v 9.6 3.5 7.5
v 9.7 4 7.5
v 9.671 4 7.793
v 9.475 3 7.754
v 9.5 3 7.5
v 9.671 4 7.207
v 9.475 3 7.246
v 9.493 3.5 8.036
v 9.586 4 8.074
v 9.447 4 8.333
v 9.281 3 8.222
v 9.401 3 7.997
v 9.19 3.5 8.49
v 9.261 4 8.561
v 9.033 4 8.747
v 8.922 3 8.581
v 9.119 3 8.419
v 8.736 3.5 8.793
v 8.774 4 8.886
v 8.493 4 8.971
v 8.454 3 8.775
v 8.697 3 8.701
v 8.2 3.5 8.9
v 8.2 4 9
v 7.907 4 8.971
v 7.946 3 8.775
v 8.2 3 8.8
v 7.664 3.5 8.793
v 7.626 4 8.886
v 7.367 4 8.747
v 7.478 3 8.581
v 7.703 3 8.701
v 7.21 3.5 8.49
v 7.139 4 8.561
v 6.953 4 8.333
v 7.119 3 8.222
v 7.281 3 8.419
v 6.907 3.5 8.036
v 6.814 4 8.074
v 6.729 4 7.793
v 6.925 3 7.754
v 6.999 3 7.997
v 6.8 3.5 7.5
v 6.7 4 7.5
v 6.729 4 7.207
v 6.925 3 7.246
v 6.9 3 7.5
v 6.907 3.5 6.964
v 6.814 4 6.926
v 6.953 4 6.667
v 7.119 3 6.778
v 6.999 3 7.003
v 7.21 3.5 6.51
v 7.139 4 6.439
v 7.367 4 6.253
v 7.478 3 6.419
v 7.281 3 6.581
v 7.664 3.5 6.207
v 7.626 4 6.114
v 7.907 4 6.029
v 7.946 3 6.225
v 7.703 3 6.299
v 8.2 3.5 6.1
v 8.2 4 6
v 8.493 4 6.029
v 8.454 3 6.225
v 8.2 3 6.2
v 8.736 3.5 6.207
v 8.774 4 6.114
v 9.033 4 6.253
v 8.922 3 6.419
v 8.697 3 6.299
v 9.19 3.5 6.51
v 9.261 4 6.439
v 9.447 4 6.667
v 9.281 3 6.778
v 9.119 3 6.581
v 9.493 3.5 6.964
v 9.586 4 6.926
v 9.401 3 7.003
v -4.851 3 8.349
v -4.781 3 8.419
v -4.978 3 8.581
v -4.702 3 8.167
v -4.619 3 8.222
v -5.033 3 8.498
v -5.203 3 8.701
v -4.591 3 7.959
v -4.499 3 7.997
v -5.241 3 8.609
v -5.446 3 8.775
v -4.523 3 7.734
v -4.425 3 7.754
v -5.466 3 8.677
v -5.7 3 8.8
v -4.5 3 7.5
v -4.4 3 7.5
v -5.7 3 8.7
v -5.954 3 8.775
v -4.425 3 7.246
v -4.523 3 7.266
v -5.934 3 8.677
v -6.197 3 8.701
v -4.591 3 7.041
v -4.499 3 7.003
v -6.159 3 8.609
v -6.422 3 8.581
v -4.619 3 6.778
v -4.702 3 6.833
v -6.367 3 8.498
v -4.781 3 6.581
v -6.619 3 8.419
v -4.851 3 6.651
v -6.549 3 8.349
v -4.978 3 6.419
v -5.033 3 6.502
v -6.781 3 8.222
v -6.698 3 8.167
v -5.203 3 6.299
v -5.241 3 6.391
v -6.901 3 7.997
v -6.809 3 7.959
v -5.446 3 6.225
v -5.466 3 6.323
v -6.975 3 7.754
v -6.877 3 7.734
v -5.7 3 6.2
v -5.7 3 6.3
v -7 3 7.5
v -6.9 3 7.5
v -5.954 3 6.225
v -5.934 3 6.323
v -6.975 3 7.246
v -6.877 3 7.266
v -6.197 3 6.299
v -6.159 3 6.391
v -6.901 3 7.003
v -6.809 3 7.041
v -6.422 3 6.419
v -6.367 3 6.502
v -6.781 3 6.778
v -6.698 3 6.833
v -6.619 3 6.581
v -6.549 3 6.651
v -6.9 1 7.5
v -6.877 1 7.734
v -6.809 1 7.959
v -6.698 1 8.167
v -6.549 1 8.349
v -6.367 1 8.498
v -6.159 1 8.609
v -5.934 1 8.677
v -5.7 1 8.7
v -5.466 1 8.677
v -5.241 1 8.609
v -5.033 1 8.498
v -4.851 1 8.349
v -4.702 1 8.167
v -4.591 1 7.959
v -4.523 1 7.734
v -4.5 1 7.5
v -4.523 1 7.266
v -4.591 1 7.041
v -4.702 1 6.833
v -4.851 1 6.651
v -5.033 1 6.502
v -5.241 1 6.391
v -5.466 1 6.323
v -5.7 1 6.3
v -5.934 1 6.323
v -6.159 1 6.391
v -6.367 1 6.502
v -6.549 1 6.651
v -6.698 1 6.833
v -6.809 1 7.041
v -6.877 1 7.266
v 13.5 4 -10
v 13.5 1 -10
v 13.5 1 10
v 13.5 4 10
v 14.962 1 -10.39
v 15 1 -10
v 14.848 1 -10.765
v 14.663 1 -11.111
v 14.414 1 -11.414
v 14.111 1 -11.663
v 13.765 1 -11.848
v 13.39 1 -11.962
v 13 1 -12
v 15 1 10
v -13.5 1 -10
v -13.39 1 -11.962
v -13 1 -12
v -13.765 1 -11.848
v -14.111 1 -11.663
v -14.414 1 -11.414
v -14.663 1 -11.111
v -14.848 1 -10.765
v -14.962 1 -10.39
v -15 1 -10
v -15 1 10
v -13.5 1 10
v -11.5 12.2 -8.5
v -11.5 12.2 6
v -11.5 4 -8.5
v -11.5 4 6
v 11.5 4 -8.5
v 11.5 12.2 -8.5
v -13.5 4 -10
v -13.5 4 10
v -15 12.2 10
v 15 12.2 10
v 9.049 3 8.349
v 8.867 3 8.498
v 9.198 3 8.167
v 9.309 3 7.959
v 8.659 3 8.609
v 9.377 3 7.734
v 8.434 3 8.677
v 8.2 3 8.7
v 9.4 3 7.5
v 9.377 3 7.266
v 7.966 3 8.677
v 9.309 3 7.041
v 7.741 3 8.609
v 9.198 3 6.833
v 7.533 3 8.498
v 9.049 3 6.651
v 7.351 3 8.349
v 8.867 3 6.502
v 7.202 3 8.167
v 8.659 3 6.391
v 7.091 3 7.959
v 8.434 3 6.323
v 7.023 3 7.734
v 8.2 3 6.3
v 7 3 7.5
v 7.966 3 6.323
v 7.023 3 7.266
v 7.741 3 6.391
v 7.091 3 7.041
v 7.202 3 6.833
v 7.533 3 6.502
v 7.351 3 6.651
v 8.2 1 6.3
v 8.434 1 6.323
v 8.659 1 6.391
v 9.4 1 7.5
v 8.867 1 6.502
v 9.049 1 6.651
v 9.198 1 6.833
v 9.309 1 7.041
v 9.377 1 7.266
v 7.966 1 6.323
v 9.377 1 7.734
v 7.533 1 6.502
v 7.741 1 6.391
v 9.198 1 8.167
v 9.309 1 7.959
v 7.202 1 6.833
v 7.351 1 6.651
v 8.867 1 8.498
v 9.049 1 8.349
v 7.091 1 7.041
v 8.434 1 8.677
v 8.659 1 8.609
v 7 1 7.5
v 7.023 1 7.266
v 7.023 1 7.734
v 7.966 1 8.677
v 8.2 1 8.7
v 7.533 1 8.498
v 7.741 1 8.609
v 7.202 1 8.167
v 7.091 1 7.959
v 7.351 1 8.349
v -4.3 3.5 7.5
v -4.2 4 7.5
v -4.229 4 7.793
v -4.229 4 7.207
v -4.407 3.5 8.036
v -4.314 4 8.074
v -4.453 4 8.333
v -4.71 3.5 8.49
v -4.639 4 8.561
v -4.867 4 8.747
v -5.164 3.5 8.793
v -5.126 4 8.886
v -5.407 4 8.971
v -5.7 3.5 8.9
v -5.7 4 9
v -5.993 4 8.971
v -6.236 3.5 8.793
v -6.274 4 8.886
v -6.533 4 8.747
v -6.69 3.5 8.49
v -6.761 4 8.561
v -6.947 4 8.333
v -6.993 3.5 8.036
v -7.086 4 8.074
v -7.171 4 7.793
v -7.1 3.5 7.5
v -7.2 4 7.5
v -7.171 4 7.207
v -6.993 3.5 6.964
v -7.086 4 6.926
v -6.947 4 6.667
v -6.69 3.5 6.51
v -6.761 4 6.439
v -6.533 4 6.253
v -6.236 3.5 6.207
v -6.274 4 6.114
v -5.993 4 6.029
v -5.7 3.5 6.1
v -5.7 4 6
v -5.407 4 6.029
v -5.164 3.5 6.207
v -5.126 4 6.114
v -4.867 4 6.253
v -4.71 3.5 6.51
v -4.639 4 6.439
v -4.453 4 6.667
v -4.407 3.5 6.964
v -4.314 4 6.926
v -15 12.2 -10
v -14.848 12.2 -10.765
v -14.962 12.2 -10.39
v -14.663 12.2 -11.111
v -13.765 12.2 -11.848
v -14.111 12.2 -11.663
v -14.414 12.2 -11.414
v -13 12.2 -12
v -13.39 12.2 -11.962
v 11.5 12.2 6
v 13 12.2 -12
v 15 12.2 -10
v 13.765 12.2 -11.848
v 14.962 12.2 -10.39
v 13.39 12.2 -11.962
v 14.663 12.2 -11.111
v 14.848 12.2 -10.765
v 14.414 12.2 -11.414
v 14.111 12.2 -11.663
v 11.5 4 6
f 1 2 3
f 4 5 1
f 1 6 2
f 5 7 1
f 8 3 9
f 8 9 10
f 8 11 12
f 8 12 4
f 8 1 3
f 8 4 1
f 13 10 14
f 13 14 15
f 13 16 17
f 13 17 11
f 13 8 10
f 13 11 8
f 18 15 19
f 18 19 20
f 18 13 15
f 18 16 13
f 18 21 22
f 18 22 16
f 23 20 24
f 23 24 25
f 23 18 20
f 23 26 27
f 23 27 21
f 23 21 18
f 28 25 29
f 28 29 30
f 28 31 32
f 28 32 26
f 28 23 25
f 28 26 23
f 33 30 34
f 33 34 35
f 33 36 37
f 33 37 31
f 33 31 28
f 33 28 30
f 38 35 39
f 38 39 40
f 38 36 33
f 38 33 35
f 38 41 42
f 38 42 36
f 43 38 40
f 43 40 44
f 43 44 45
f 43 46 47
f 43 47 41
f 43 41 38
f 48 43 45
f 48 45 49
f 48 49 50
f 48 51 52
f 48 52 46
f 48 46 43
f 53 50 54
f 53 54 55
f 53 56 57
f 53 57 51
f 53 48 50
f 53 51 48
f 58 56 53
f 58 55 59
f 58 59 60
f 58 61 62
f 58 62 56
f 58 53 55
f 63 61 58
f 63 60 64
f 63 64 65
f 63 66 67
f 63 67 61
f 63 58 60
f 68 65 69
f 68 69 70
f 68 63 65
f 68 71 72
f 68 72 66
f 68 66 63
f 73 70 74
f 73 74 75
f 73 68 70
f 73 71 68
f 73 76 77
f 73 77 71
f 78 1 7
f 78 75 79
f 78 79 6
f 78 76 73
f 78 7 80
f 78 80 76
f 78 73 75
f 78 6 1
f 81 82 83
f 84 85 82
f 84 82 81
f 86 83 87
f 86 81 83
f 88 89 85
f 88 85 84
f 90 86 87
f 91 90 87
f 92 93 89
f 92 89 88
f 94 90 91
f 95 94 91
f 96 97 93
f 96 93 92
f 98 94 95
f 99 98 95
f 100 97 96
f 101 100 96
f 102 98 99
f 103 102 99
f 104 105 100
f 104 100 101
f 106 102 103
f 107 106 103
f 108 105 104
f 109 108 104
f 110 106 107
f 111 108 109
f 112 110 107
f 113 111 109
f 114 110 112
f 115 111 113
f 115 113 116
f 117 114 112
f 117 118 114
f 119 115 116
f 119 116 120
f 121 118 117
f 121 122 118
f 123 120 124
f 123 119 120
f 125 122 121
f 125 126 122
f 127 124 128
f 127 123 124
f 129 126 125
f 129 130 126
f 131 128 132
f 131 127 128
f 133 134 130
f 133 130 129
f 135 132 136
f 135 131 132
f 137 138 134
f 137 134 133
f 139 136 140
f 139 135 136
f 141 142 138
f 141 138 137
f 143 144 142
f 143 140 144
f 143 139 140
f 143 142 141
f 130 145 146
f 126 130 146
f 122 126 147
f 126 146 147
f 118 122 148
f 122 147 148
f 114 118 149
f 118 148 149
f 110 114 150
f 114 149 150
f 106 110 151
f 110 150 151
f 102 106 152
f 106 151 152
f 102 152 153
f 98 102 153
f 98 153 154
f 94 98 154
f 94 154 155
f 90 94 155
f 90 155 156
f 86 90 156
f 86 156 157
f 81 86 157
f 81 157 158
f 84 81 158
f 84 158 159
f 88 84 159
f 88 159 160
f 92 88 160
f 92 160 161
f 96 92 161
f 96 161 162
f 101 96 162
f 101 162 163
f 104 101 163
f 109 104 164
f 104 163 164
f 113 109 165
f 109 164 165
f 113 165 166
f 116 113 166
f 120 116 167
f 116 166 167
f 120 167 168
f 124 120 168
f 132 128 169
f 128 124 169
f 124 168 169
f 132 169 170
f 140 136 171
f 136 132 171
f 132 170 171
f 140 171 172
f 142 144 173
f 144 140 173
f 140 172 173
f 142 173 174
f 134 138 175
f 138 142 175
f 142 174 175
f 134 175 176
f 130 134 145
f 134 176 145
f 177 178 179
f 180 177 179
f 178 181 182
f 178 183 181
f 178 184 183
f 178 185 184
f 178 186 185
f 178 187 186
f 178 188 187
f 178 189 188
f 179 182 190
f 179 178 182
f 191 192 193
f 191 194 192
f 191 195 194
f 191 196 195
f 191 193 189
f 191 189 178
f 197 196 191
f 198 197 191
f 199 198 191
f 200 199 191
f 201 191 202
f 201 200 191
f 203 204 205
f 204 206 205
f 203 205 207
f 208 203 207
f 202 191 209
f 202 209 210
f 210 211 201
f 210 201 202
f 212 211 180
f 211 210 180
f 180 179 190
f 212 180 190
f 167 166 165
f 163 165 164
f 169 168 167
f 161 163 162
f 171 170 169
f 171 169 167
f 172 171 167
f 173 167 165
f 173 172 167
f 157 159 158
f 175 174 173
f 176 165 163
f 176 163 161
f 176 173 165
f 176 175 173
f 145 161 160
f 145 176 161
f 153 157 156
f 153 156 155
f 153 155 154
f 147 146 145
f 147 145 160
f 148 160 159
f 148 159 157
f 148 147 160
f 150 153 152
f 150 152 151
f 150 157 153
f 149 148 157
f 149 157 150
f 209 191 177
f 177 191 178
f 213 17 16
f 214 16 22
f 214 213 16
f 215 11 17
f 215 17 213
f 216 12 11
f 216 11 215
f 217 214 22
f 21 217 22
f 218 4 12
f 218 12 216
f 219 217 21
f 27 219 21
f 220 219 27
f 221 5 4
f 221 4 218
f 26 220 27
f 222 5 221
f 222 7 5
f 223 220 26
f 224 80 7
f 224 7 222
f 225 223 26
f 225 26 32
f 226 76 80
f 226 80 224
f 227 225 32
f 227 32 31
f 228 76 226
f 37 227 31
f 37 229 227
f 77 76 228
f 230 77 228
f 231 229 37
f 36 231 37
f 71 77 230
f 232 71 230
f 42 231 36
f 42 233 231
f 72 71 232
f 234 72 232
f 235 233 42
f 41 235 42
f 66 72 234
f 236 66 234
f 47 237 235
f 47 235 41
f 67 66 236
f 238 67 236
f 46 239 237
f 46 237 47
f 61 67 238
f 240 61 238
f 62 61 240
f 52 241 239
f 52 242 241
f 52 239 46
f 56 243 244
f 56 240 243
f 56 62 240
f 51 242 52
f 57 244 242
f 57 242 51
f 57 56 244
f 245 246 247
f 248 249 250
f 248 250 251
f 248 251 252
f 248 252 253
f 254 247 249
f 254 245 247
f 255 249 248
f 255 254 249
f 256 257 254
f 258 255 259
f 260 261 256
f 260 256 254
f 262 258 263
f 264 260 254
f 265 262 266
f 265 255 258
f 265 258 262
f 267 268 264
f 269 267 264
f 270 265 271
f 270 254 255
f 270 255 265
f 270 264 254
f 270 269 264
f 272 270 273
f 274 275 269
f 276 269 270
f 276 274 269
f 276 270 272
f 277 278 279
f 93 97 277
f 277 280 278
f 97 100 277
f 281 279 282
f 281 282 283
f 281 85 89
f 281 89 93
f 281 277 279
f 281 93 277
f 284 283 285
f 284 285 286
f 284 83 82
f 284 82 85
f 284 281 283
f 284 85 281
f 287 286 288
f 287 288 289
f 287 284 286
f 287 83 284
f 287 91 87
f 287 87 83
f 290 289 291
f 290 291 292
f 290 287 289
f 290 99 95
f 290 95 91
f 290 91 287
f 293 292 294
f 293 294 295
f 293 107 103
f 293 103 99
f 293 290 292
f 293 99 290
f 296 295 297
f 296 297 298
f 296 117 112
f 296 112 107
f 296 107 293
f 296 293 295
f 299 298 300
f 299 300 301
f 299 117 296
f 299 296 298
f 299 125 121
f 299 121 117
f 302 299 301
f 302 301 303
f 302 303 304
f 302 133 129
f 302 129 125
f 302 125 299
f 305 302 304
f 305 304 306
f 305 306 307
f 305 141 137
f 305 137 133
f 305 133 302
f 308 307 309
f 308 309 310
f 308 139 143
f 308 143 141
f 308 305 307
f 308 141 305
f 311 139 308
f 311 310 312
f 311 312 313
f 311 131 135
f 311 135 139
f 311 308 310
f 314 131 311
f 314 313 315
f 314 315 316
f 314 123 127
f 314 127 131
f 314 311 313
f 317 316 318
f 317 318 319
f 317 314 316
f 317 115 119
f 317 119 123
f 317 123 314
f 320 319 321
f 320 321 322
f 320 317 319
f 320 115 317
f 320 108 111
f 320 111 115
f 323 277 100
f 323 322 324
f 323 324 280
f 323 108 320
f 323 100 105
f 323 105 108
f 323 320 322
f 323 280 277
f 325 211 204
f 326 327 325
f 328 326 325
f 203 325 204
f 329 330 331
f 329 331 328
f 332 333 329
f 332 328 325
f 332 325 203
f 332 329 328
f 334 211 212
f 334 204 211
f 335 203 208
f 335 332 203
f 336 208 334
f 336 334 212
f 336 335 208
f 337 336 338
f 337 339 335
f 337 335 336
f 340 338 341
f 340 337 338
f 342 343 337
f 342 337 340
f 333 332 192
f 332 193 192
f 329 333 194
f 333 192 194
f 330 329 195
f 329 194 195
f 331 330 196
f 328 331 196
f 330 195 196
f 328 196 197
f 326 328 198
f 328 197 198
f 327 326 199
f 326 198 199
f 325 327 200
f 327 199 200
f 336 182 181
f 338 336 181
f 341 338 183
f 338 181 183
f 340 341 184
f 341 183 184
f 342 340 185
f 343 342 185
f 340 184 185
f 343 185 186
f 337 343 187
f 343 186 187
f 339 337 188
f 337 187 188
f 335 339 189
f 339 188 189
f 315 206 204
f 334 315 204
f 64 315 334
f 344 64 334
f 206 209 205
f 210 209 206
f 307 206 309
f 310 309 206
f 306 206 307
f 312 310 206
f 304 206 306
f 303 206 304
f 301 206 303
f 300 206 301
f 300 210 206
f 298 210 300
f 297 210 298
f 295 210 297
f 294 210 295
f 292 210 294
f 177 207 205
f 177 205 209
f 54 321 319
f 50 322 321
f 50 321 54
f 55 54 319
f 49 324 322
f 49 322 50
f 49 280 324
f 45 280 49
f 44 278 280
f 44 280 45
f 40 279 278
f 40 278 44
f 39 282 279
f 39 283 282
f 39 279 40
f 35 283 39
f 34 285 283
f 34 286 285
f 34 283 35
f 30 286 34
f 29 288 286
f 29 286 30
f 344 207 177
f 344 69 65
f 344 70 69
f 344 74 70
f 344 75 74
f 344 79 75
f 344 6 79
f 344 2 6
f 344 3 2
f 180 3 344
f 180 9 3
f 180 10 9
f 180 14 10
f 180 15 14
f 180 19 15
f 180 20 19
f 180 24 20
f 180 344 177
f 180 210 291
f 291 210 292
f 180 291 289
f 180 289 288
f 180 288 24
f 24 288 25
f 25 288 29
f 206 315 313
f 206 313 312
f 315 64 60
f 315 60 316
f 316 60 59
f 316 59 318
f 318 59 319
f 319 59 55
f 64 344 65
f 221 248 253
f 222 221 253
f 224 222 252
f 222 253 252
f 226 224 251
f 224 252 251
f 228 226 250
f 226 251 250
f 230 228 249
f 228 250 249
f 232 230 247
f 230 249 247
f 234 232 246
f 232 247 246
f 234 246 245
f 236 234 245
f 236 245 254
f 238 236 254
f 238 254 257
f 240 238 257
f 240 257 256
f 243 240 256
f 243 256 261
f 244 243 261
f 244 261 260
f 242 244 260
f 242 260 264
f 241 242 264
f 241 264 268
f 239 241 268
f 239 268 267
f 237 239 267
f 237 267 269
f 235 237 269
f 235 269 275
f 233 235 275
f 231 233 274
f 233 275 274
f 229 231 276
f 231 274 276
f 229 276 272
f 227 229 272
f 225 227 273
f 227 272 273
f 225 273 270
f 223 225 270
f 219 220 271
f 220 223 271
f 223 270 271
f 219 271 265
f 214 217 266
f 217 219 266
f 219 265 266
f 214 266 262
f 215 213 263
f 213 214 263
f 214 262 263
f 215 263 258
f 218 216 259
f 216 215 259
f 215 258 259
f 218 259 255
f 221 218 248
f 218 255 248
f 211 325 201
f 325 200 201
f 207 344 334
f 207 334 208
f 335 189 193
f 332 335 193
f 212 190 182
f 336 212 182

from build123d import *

# Parameters (mm, degrees)
RESSALTO_EXTRUS_O1_DEPTH = 4
RESSALTO_EXTRUS_O2_DEPTH = 4
ESBO_O2_W                = 30
ESBO_O2_H                = 4
RESSALTO_EXTRUS_O3_DEPTH = 5
RESSALTO_EXTRUS_O4_DEPTH = 5
ESBO_O5_W                = 22
ESBO_O5_H                = 1
CORTE_EXTRUS_O2_DEPTH    = 35
CORTE_EXTRUS_O3_DEPTH    = 10
ESBO_O9_W                = 23
ESBO_O9_H                = 14.5
RESSALTO_EXTRUS_O5_DEPTH = 3.2
ESBO_O4_W                = 0.5
ESBO_O4_H                = 20
CORTE_EXTRUS_O4_DEPTH    = 4
ESBO_O11_R               = 1.5
ESBO_O12_R               = 1.3
ESBO_O11_4_R             = 1.5
ESBO_O12_4_R             = 1.3


with BuildPart() as part:
    # Esboço1 → Ressalto-extrusão1 (new body)
    with BuildSketch(Plane(origin=(0, 0, 0), x_dir=(1, 0, 0), z_dir=(0, 1, 0))):
        with BuildLine():
            ThreePointArc((-4.5, -7.5), (-5.7, -6.3), (-6.9, -7.5))
            Line((-6.9, -7.5), (-5.7, -7.5))
            Line((-5.7, -7.5), (-4.5, -7.5))
        make_face()
        with BuildLine():
            Line((-5.7, -7.5), (-6.9, -7.5))
            ThreePointArc((-6.9, -7.5), (-5.7, -8.7), (-4.5, -7.5))
            Line((-4.5, -7.5), (-5.7, -7.5))
        make_face()
        with BuildLine():
            ThreePointArc((7, -7.5), (8.2, -8.7), (9.4, -7.5))
            Line((9.4, -7.5), (8.2, -7.5))
            Line((8.2, -7.5), (7, -7.5))
        make_face()
        with BuildLine():
            Line((8.2, -7.5), (9.4, -7.5))
            ThreePointArc((9.4, -7.5), (8.2, -6.3), (7, -7.5))
            Line((7, -7.5), (8.2, -7.5))
        make_face()
    extrude(amount=RESSALTO_EXTRUS_O1_DEPTH)



with BuildPart() as body_2:
    # Esboço1<3> → Ressalto-extrusão2 (new body)
    with BuildSketch(Plane(origin=(0, 0, 0), x_dir=(1, 0, 0), z_dir=(0, 1, 0))):
        Polygon((-13, -10), (-13, -9), (-13, -7.5), (-13, 10), (-11.5, 10), (13, 10), (13, -7.5), (13, -9), (13, -10), (15, -10), (15, 10), (15, 12), (13, 12), (-13, 12), (-15, 12), (-15, 10), (-15, -10), align=None)
    extrude(amount=RESSALTO_EXTRUS_O2_DEPTH)


with BuildPart() as part_1:
    add(part.part)

    add(body_2.part)  # Ressalto-extrusão3 merges body 2
    # Esboço2 → Ressalto-extrusão3 (add)
    with BuildSketch(Plane(origin=(0, 4, 0), x_dir=(1, 0, 0), z_dir=(0, 1, 0))):
        with Locations((0, -8)):
            Rectangle(ESBO_O2_W, ESBO_O2_H)
    extrude(amount=RESSALTO_EXTRUS_O3_DEPTH)

    # Esboço3 → Ressalto-extrusão4 (add)
    with BuildSketch(Plane(origin=(0, 4, 0), x_dir=(1, 0, 0), z_dir=(0, 1, 0))):
        Polygon((-11.5, 8.5), (11.5, 8.5), (11.5, -6), (13, -6), (13, 10), (-13, 10), (-13, -6), (-11.5, -6), align=None)
        Polygon((13, 10), (13, -6), (15, -6), (15, 12), (-15, 12), (-15, -6), (-13, -6), (-13, 10), align=None)
    extrude(amount=RESSALTO_EXTRUS_O4_DEPTH)

    # Esboço5 → Corte-extrusão2 (cut)
    with BuildSketch(Plane.ZY.offset(15)):
        with Locations((-1, 0.5)):
            Rectangle(ESBO_O5_W, ESBO_O5_H)
    extrude(amount=-CORTE_EXTRUS_O2_DEPTH, mode=Mode.SUBTRACT)

    # Esboço8 → Corte-extrusão3 (cut)
    with BuildSketch(Plane.XZ.offset(-1)):
        with BuildLine():
            Line((-15, -12), (-13, -12))
            ThreePointArc((-13, -12), (-14.414213562, -11.414213562), (-15, -10))
            Line((-15, -10), (-15, -12))
        make_face()
        with BuildLine():
            ThreePointArc((15, -10), (14.414213562, -11.414213562), (13, -12))
            Line((13, -12), (15, -12))
            Line((15, -12), (15, -10))
        make_face()
    extrude(amount=-CORTE_EXTRUS_O3_DEPTH, mode=Mode.SUBTRACT)

    # Esboço9 → Ressalto-extrusão5 (add)
    with BuildSketch(Plane(origin=(0, 9, 0), x_dir=(1, 0, 0), z_dir=(0, 1, 0))):
        with BuildLine():
            Line((13, 12), (-13, 12))
            ThreePointArc((-13, 12), (-14.414213562, 11.414213562), (-15, 10))
            Line((-15, 10), (-15, -10))
            Line((-15, -10), (15, -10))
            Line((15, -10), (15, 10))
            ThreePointArc((15, 10), (14.414213562, 11.414213562), (13, 12))
        make_face()
        with Locations((0, 1.25)):
            Rectangle(ESBO_O9_W, ESBO_O9_H, mode=Mode.SUBTRACT)
    extrude(amount=RESSALTO_EXTRUS_O5_DEPTH)

    # Esboço4 → Corte-extrusão4 (cut)
    with BuildSketch(Plane.XZ):
        with Locations((-13.25, 0)):
            Rectangle(ESBO_O4_W, ESBO_O4_H)
        with Locations((13.25, 0)):
            Rectangle(ESBO_O4_W, ESBO_O4_H)
    extrude(amount=-CORTE_EXTRUS_O4_DEPTH, mode=Mode.SUBTRACT)

    # Esboço11 → Loft4 section 0
    with BuildSketch(Plane.XZ.offset(-4)):
        with Locations((-5.7, 7.5)):
            Circle(ESBO_O11_R)
    # Esboço12 → Loft4 section 1
    with BuildSketch(Plane(origin=(0, 3, 0), x_dir=(-1, 0, 0), z_dir=(0, -1, 0))):
        with Locations((5.7, -7.5)):
            Circle(ESBO_O12_R)
    loft()

    # Esboço11<4> → Loft5 section 0
    with BuildSketch(Plane.XZ.offset(-4)):
        with Locations((8.2, 7.5)):
            Circle(ESBO_O11_4_R)
    # Esboço12<4> → Loft5 section 1
    with BuildSketch(Plane(origin=(0, 3, 0), x_dir=(-1, 0, 0), z_dir=(0, -1, 0))):
        with Locations((-8.2, -7.5)):
            Circle(ESBO_O12_4_R)
    loft()


solid = part_1.part
